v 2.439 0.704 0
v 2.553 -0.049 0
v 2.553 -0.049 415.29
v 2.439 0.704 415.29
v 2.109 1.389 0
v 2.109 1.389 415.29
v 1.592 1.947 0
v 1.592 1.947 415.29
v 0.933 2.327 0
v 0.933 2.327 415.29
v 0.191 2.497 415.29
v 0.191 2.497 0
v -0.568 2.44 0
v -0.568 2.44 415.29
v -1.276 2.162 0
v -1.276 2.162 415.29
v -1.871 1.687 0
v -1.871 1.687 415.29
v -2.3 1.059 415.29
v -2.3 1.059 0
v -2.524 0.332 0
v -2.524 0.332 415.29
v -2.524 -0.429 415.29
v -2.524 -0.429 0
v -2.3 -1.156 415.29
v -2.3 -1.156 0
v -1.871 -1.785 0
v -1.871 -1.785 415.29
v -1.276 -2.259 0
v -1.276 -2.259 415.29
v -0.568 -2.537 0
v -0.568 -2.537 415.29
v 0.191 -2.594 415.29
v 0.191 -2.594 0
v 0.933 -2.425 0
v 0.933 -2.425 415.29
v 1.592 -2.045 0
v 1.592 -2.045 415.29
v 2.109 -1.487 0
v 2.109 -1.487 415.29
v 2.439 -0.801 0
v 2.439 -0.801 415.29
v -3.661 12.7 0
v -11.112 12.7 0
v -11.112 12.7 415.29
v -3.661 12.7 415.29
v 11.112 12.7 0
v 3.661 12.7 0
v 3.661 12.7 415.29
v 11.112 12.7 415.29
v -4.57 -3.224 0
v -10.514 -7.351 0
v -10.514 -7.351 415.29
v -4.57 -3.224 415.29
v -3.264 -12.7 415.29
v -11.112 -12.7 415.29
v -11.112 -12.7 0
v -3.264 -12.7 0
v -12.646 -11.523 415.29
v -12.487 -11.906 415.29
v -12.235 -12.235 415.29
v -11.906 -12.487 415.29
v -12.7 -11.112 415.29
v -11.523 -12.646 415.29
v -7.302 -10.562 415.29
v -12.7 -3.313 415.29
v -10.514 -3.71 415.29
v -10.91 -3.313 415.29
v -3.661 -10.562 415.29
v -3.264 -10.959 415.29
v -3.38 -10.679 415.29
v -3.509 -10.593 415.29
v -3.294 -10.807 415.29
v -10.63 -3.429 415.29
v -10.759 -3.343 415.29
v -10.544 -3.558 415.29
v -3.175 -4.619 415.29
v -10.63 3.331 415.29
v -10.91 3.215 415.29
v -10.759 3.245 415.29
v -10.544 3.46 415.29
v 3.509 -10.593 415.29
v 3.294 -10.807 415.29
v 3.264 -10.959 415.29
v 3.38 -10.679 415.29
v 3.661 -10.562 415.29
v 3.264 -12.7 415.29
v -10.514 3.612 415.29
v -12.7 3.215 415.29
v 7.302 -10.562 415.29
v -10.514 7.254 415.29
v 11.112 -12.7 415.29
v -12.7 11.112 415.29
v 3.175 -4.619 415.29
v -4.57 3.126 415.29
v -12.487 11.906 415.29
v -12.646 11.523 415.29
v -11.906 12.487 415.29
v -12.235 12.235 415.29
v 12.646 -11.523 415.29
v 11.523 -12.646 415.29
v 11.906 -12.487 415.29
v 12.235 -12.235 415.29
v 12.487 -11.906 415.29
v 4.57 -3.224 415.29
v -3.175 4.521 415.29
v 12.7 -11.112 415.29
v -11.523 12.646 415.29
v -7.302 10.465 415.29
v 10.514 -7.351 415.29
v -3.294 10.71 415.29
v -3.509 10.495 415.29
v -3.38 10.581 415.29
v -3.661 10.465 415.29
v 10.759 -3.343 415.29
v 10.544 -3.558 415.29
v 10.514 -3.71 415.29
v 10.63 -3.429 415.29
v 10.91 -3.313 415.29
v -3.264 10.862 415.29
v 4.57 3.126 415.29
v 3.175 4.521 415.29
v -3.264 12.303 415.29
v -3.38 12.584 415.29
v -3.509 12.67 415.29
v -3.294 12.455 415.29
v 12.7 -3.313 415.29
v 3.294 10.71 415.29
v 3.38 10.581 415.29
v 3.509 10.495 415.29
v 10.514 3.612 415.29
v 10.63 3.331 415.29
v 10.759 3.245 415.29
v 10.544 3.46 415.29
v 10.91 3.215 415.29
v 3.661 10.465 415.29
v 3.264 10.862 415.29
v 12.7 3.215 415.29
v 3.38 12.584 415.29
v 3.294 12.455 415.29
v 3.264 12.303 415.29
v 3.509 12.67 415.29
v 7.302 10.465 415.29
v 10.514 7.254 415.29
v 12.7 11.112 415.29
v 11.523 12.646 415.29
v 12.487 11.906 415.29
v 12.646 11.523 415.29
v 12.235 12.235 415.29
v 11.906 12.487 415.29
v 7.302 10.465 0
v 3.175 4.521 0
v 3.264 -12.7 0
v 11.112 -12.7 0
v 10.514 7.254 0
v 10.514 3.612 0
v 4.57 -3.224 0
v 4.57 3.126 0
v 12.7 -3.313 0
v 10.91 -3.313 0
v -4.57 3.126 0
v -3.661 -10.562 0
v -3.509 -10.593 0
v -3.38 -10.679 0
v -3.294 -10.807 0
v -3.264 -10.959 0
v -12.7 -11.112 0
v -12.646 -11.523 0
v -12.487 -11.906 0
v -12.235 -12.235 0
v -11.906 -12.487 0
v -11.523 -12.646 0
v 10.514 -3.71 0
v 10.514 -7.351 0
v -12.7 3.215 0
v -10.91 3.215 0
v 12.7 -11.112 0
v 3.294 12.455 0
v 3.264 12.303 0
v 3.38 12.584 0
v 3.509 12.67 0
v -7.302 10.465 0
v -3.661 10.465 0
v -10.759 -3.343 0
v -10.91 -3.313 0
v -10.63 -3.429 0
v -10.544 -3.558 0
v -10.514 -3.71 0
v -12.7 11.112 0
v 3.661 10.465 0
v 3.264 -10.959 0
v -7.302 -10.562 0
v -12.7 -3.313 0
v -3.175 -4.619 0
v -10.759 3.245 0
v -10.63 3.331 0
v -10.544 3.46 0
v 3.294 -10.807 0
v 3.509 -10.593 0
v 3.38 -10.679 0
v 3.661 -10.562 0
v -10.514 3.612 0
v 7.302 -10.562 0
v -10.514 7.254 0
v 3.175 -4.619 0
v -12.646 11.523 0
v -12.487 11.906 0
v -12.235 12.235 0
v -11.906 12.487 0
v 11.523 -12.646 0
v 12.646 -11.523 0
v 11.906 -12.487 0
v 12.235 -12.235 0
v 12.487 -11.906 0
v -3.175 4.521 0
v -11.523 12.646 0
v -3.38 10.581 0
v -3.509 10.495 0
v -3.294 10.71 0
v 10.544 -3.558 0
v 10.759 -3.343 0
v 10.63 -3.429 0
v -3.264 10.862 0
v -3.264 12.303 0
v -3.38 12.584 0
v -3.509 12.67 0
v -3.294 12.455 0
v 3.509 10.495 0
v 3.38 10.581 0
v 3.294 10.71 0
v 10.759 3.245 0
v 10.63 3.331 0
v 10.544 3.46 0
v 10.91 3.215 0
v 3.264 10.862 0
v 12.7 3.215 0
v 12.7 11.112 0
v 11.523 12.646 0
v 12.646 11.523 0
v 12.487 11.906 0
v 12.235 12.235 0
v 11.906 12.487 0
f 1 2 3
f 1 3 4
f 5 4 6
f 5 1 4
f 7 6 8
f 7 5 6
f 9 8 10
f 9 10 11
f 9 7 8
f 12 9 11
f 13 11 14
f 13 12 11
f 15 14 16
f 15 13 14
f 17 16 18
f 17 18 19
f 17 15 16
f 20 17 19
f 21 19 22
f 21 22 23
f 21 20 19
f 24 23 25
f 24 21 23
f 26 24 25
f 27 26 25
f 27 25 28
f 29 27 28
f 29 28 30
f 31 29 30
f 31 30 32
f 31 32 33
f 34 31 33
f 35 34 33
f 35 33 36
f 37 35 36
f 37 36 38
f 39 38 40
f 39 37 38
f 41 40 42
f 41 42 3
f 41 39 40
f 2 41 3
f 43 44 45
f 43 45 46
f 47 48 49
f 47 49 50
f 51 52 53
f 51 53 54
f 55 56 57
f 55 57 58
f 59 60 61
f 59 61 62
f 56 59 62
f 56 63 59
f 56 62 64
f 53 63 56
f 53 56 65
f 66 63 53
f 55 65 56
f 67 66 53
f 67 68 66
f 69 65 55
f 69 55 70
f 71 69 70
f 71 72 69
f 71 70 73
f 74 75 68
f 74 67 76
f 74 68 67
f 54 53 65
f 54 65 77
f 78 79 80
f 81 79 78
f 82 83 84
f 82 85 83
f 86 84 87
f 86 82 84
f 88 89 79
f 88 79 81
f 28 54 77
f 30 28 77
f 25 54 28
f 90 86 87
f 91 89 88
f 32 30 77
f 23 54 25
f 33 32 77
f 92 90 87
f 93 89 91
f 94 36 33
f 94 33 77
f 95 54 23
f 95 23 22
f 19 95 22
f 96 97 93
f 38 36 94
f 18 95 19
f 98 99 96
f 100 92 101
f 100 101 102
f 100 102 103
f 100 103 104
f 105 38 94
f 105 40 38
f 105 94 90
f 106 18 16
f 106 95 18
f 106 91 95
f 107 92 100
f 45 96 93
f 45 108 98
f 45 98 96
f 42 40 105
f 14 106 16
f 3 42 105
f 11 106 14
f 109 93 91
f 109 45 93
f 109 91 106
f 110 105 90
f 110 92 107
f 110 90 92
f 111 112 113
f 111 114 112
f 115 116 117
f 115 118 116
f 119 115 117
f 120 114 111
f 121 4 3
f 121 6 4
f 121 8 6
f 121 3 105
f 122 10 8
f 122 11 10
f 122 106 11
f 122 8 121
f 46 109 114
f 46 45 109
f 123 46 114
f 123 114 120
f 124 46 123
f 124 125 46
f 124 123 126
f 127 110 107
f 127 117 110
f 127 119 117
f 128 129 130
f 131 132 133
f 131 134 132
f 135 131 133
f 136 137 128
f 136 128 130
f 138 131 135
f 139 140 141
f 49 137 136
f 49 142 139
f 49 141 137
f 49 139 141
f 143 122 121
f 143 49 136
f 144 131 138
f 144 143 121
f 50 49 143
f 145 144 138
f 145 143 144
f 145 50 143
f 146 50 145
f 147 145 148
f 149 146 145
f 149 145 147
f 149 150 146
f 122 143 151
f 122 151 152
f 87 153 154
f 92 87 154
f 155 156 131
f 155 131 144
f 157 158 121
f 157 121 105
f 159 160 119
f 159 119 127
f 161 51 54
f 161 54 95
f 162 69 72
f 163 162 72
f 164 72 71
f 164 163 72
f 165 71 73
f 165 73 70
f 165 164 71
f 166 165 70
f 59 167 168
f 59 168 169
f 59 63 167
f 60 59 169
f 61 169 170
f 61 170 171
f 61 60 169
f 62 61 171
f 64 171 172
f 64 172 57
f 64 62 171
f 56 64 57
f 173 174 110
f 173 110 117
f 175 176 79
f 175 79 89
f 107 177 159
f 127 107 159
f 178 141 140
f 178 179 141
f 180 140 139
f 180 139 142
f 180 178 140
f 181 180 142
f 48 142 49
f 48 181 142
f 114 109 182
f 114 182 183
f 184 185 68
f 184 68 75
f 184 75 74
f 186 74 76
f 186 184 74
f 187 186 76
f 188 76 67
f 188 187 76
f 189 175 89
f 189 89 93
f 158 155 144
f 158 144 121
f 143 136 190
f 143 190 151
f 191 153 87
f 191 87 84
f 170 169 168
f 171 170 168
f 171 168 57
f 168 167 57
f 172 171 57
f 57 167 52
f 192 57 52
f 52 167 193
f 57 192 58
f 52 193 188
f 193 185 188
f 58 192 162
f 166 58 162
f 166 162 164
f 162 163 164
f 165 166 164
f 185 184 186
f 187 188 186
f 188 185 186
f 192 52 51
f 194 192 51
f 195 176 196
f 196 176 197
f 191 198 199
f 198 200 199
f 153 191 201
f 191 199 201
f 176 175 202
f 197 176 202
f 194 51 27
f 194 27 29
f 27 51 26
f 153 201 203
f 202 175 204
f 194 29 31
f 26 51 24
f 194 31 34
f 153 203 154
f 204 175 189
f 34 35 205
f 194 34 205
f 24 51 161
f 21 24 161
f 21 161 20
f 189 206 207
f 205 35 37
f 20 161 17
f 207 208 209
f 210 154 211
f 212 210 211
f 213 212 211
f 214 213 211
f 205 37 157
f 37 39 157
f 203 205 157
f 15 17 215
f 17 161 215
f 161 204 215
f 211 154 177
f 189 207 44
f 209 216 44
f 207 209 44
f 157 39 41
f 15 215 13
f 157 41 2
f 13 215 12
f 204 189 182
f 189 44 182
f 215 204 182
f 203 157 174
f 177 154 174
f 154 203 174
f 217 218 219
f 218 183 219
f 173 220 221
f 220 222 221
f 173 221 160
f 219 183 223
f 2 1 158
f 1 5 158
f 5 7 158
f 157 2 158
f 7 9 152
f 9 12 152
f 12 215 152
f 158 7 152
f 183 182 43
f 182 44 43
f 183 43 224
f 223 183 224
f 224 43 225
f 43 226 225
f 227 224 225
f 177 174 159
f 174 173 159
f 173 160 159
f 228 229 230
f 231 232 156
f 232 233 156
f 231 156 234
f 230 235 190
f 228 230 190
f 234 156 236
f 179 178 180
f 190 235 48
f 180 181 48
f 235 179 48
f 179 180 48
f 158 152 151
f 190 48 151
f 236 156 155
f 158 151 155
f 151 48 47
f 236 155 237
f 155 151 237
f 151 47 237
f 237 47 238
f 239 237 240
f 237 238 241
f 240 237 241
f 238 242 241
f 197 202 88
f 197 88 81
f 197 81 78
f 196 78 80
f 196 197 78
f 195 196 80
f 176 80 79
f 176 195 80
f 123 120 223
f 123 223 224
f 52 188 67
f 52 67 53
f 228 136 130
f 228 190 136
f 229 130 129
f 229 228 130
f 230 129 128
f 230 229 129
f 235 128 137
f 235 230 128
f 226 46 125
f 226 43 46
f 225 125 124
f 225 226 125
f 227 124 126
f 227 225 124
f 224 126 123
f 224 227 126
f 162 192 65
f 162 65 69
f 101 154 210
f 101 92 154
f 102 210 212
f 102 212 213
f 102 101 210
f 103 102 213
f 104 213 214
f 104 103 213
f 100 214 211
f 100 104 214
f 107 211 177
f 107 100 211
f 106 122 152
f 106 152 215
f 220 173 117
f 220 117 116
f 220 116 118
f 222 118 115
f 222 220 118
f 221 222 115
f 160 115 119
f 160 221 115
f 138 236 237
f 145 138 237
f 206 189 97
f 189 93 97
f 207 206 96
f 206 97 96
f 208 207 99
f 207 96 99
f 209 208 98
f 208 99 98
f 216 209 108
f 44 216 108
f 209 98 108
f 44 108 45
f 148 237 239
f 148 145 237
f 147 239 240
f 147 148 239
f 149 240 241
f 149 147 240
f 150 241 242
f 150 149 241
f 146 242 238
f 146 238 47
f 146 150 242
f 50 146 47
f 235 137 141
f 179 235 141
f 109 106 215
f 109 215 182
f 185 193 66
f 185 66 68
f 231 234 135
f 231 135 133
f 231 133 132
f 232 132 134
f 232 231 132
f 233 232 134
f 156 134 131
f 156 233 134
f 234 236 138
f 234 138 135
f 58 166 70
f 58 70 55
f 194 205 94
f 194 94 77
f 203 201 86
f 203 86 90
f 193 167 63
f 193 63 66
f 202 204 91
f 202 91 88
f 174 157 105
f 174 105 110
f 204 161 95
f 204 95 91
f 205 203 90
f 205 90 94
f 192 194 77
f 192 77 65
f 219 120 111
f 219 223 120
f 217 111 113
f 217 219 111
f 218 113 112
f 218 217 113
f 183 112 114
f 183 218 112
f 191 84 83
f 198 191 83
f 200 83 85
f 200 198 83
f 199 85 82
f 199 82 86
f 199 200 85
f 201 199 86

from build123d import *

# Parameters (mm, degrees)
SKETCH1_W           = 25.4
SKETCH1_H           = 25.4
BOSS_EXTRUDE1_DEPTH = 415.29
FILLET1_R           = 1.5875
HOLE1_OUTLINE_R     = 2.5527
HOLE1_DEPTH         = 415.29
SKETCH7_W           = 6.5278
SKETCH7_H           = 2.2352
CUT_EXTRUDE2_DEPTH  = 415.29
FILLET4_R           = 0.396875
CIRPATTERN2_DEPTH   = 415.29


# Read off the part's stored shape, not the designer's step: Hole1, CirPattern2
with BuildPart() as part:
    # Sketch1 → Boss-Extrude1 (new body)
    with BuildSketch(Plane.XY):
        Rectangle(SKETCH1_W, SKETCH1_H)
    extrude(amount=BOSS_EXTRUDE1_DEPTH)

    # Fillet1
    fillet1_edges = [part.edges().sort_by_distance(p)[0] for p in [
        (12.7, -12.7, 207.645),
        (-12.7, -12.7, 207.645),
        (-12.7, 12.7, 207.645),
        (12.7, 12.7, 207.645),
    ]]
    fillet(fillet1_edges, radius=FILLET1_R)

    # Hole1 outline → Hole1 (cut)
    with BuildSketch(Plane.XY):
        with Locations((0, -0.048792482)):
            Circle(HOLE1_OUTLINE_R)
    extrude(amount=HOLE1_DEPTH, mode=Mode.SUBTRACT)

    # Sketch7 → Cut-Extrude2 (cut)
    with BuildSketch(Plane.XY.offset(415.29)):
        with Locations((0, 11.5824)):
            Rectangle(SKETCH7_W, SKETCH7_H)
        Polygon((-3.175, 4.5212), (-7.3025, 10.4648), (7.3025, 10.4648), (3.175, 4.5212), align=None)
    extrude(amount=-CUT_EXTRUDE2_DEPTH, mode=Mode.SUBTRACT)

    # Fillet4
    fillet4_edges = [part.edges().sort_by_distance(p)[0] for p in [
        (-3.2639, 10.4648, 207.645),
        (-3.2639, 12.7, 207.645),
        (3.2639, 12.7, 207.645),
        (3.2639, 10.4648, 207.645),
    ]]
    fillet(fillet4_edges, radius=FILLET4_R)

    # CirPattern2 outline → CirPattern2 (cut)
    with BuildSketch(Plane.XY):
        with BuildLine():
            ThreePointArc((-3.660775, -10.562384964), (-3.380141996, -10.67862696), (-3.2639, -10.959259964))
            Line((-3.2639, -10.959259964), (-3.2639, -12.7))
            Line((-3.2639, -12.7), (3.2639, -12.7))
            Line((3.2639, -12.7), (3.2639, -10.959259964))
            ThreePointArc((3.2639, -10.959259964), (3.380141996, -10.67862696), (3.660775, -10.562384964))
            Line((3.660775, -10.562384964), (7.3025, -10.562384964))
            Line((7.3025, -10.562384964), (3.175, -4.618784964))
            Line((3.175, -4.618784964), (-3.175, -4.618784964))
            Line((-3.175, -4.618784964), (-7.3025, -10.562384964))
            Line((-7.3025, -10.562384964), (-3.660775, -10.562384964))
        make_face()
        with BuildLine():
            Line((-12.7, -3.312692482), (-10.910467482, -3.312692482))
            ThreePointArc((-10.910467482, -3.312692482), (-10.629834478, -3.428934478), (-10.513592482, -3.709567482))
            Line((-10.513592482, -3.709567482), (-10.513592482, -7.351292482))
            Line((-10.513592482, -7.351292482), (-4.569992482, -3.223792482))
            Line((-4.569992482, -3.223792482), (-4.569992482, 3.126207518))
            Line((-4.569992482, 3.126207518), (-10.513592482, 7.253707518))
            Line((-10.513592482, 7.253707518), (-10.513592482, 3.611982518))
            ThreePointArc((-10.513592482, 3.611982518), (-10.629834478, 3.331349514), (-10.910467482, 3.215107518))
            Line((-10.910467482, 3.215107518), (-12.7, 3.215107518))
            Line((-12.7, 3.215107518), (-12.7, -3.312692482))
        make_face()
        with BuildLine():
            ThreePointArc((10.513592482, -3.709567482), (10.629834478, -3.428934478), (10.910467482, -3.312692482))
            Line((10.910467482, -3.312692482), (12.7, -3.312692482))
            Line((12.7, -3.312692482), (12.7, 3.215107518))
            Line((12.7, 3.215107518), (10.910467482, 3.215107518))
            ThreePointArc((10.910467482, 3.215107518), (10.629834478, 3.331349514), (10.513592482, 3.611982518))
            Line((10.513592482, 3.611982518), (10.513592482, 7.253707518))
            Line((10.513592482, 7.253707518), (4.569992482, 3.126207518))
            Line((4.569992482, 3.126207518), (4.569992482, -3.223792482))
            Line((4.569992482, -3.223792482), (10.513592482, -7.351292482))
            Line((10.513592482, -7.351292482), (10.513592482, -3.709567482))
        make_face()
    extrude(amount=CIRPATTERN2_DEPTH, mode=Mode.SUBTRACT)


solid = part.part
